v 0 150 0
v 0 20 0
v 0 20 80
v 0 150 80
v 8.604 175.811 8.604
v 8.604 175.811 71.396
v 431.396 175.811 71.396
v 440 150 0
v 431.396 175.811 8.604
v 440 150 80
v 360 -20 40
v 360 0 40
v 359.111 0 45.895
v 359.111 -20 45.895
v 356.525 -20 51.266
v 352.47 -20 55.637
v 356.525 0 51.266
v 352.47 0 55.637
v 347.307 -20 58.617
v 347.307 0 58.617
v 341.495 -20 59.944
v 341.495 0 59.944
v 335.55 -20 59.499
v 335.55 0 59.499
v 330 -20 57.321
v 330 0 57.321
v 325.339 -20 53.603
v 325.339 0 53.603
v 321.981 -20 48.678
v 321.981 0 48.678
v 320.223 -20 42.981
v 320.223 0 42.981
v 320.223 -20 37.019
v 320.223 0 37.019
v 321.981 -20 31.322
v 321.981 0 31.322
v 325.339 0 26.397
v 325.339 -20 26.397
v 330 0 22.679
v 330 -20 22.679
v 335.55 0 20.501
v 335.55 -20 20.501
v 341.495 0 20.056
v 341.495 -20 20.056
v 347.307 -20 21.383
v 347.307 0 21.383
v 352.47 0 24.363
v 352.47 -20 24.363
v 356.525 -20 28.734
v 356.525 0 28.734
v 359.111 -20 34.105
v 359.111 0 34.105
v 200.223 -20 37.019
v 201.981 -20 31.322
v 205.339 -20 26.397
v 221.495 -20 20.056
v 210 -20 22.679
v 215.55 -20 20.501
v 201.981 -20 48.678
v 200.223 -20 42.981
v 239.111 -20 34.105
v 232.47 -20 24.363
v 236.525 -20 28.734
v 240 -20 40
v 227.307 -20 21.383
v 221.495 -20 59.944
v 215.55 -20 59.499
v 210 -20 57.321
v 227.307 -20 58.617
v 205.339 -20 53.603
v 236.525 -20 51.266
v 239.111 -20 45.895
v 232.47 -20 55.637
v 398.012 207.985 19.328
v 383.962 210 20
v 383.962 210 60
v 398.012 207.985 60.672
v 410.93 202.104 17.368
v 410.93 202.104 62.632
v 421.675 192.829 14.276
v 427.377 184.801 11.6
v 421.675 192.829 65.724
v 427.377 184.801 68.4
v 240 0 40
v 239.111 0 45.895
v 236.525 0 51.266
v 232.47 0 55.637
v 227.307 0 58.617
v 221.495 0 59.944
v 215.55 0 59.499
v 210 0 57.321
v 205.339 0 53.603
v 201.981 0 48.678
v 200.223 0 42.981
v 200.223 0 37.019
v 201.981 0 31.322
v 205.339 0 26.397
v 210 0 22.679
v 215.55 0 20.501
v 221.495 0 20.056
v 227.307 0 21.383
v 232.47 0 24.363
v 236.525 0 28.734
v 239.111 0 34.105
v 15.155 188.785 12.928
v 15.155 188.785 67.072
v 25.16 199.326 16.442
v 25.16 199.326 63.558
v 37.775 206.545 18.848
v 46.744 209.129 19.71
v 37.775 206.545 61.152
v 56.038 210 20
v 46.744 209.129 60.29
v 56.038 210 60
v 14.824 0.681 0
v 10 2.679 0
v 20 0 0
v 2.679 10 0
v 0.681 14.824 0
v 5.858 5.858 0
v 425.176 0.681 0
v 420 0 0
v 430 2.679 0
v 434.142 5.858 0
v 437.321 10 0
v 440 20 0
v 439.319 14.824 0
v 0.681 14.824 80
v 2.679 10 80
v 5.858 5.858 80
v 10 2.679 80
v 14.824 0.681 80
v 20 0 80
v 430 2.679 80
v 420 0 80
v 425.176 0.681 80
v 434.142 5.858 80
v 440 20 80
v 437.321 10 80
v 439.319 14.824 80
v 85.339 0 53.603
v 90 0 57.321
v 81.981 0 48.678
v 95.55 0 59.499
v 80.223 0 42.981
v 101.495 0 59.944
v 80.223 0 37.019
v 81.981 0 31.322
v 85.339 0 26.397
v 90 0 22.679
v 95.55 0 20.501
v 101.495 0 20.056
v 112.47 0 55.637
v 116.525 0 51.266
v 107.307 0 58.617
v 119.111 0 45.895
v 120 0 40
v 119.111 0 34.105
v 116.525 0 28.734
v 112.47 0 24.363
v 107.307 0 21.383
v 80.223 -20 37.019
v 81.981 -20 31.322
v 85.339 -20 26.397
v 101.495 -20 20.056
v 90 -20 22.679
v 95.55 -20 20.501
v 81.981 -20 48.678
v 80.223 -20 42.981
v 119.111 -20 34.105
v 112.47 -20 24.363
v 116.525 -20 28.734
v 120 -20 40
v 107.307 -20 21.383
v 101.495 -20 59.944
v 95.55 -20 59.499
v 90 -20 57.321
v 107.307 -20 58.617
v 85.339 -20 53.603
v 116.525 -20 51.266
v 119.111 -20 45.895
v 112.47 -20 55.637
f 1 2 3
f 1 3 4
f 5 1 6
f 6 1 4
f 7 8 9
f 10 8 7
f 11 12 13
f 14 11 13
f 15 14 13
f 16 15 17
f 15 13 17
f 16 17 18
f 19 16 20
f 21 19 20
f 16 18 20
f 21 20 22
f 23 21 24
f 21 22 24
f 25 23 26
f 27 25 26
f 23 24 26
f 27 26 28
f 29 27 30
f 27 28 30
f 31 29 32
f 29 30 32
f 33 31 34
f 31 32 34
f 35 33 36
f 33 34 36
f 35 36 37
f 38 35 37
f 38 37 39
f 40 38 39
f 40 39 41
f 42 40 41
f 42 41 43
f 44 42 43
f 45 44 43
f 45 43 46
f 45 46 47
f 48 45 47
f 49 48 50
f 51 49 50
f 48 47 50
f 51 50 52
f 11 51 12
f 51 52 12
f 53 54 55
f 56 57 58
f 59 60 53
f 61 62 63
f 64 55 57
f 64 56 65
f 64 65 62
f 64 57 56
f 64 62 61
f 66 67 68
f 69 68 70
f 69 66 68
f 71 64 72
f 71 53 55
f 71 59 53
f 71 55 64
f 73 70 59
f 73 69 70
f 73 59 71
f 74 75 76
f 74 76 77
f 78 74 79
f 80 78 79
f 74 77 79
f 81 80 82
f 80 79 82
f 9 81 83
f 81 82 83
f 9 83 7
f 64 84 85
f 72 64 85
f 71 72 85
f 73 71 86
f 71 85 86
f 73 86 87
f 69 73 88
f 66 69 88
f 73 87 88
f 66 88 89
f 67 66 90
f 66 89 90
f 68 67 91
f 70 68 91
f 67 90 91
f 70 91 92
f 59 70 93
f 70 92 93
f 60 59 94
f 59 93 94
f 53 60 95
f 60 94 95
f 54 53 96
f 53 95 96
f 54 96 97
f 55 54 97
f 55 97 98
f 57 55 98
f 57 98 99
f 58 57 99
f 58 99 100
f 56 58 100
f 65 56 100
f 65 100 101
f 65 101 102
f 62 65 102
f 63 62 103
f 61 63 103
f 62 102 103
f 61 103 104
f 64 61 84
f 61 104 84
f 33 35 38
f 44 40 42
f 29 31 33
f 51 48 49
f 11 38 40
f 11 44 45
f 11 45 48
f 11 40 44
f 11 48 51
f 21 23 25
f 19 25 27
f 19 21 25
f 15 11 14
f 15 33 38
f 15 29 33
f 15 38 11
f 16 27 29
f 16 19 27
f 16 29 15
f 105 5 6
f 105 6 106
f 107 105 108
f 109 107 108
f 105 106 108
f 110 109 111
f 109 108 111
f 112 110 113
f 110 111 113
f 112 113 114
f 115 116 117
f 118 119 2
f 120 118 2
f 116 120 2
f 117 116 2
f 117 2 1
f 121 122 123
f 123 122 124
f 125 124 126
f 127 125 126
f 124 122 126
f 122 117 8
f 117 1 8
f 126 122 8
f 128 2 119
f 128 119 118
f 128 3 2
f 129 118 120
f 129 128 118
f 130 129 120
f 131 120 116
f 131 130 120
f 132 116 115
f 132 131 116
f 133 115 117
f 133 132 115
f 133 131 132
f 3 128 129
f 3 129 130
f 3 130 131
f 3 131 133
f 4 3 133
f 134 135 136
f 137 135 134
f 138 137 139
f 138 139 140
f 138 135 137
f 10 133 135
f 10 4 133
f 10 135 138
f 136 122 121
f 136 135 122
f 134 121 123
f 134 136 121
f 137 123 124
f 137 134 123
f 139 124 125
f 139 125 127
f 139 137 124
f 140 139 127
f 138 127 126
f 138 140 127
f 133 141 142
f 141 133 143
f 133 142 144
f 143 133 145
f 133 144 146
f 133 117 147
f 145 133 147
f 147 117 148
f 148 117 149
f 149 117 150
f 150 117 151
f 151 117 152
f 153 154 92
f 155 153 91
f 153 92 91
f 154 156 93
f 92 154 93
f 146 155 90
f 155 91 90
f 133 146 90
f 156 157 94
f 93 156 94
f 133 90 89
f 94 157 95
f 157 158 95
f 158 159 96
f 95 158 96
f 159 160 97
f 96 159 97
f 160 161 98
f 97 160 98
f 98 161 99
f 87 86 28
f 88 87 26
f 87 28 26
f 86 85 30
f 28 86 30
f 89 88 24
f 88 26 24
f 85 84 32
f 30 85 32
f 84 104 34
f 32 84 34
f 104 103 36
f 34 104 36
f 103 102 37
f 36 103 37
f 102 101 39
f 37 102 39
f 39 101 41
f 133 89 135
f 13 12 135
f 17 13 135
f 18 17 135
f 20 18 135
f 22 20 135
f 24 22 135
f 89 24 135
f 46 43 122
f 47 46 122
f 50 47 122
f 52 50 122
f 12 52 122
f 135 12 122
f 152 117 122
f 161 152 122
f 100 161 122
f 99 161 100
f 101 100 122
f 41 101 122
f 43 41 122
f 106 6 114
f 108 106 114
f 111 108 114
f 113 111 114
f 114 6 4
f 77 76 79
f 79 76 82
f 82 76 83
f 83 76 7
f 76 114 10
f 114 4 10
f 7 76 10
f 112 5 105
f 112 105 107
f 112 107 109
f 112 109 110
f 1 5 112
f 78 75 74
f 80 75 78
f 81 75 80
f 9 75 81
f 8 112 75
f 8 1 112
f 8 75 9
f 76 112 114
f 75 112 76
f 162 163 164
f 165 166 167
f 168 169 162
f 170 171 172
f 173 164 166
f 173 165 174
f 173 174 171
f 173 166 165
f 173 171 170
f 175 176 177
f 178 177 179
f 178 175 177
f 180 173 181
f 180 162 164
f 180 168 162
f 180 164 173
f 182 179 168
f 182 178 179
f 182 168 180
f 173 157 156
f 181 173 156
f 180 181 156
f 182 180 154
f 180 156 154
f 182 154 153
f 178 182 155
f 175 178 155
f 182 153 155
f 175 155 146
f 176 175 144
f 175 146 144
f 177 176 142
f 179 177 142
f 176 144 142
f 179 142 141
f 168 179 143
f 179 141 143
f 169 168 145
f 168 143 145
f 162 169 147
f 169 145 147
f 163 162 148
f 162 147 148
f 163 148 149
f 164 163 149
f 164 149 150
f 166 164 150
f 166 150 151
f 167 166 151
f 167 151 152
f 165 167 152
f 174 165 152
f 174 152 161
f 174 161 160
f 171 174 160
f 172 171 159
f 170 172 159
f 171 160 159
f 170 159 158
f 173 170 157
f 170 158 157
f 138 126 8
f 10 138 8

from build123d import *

# Parameters (mm, degrees)
F0_W     = 440
F0_H     = 210
F1_DEPTH = 80
F2_SIZE2 = 60
F2_SIZE  = 20
F3_R     = 50
F4_R     = 50
F5_R     = 20
F6_R     = 20
F7_R     = 20
F8_DEPTH = 20


with BuildPart() as f1:
    # F0 (on Top) → F1 (new body)
    with BuildSketch(Plane.XY):
        with Locations((220, 105)):
            Rectangle(F0_W, F0_H)
    extrude(amount=F1_DEPTH)

    # F2
    f2_edges = [f1.edges().sort_by_distance(p)[0] for p in [
        (440, 210, 40),
        (0, 210, 40),
        (220, 210, 0),
        (220, 210, 80),
    ]]
    f2_side = f1.faces().sort_by_distance((220, 210, 40))[0]
    chamfer(f2_edges, length=F2_SIZE, length2=F2_SIZE2, reference=f2_side)

    # F3
    f3_edges = [f1.edges().sort_by_distance(p)[0] for p in [
        (20, 210, 40),
    ]]
    fillet(f3_edges, radius=F3_R)

    # F4
    f4_edges = [f1.edges().sort_by_distance(p)[0] for p in [
        (420, 210, 40),
    ]]
    fillet(f4_edges, radius=F4_R)

    # F5
    f5_edges = [f1.edges().sort_by_distance(p)[0] for p in [
        (0, 0, 40),
    ]]
    fillet(f5_edges, radius=F5_R)

    # F6
    f6_edges = [f1.edges().sort_by_distance(p)[0] for p in [
        (440, 0, 40),
    ]]
    fillet(f6_edges, radius=F6_R)

    # F7 (on face) → F8 (join)
    with BuildSketch(Plane.XZ):
        with Locations((100, 40)):
            Circle(F7_R)
        with Locations((220, 40)):
            Circle(F7_R)
        with Locations((340, 40)):
            Circle(F7_R)
    extrude(amount=F8_DEPTH)


solid = f1.part
